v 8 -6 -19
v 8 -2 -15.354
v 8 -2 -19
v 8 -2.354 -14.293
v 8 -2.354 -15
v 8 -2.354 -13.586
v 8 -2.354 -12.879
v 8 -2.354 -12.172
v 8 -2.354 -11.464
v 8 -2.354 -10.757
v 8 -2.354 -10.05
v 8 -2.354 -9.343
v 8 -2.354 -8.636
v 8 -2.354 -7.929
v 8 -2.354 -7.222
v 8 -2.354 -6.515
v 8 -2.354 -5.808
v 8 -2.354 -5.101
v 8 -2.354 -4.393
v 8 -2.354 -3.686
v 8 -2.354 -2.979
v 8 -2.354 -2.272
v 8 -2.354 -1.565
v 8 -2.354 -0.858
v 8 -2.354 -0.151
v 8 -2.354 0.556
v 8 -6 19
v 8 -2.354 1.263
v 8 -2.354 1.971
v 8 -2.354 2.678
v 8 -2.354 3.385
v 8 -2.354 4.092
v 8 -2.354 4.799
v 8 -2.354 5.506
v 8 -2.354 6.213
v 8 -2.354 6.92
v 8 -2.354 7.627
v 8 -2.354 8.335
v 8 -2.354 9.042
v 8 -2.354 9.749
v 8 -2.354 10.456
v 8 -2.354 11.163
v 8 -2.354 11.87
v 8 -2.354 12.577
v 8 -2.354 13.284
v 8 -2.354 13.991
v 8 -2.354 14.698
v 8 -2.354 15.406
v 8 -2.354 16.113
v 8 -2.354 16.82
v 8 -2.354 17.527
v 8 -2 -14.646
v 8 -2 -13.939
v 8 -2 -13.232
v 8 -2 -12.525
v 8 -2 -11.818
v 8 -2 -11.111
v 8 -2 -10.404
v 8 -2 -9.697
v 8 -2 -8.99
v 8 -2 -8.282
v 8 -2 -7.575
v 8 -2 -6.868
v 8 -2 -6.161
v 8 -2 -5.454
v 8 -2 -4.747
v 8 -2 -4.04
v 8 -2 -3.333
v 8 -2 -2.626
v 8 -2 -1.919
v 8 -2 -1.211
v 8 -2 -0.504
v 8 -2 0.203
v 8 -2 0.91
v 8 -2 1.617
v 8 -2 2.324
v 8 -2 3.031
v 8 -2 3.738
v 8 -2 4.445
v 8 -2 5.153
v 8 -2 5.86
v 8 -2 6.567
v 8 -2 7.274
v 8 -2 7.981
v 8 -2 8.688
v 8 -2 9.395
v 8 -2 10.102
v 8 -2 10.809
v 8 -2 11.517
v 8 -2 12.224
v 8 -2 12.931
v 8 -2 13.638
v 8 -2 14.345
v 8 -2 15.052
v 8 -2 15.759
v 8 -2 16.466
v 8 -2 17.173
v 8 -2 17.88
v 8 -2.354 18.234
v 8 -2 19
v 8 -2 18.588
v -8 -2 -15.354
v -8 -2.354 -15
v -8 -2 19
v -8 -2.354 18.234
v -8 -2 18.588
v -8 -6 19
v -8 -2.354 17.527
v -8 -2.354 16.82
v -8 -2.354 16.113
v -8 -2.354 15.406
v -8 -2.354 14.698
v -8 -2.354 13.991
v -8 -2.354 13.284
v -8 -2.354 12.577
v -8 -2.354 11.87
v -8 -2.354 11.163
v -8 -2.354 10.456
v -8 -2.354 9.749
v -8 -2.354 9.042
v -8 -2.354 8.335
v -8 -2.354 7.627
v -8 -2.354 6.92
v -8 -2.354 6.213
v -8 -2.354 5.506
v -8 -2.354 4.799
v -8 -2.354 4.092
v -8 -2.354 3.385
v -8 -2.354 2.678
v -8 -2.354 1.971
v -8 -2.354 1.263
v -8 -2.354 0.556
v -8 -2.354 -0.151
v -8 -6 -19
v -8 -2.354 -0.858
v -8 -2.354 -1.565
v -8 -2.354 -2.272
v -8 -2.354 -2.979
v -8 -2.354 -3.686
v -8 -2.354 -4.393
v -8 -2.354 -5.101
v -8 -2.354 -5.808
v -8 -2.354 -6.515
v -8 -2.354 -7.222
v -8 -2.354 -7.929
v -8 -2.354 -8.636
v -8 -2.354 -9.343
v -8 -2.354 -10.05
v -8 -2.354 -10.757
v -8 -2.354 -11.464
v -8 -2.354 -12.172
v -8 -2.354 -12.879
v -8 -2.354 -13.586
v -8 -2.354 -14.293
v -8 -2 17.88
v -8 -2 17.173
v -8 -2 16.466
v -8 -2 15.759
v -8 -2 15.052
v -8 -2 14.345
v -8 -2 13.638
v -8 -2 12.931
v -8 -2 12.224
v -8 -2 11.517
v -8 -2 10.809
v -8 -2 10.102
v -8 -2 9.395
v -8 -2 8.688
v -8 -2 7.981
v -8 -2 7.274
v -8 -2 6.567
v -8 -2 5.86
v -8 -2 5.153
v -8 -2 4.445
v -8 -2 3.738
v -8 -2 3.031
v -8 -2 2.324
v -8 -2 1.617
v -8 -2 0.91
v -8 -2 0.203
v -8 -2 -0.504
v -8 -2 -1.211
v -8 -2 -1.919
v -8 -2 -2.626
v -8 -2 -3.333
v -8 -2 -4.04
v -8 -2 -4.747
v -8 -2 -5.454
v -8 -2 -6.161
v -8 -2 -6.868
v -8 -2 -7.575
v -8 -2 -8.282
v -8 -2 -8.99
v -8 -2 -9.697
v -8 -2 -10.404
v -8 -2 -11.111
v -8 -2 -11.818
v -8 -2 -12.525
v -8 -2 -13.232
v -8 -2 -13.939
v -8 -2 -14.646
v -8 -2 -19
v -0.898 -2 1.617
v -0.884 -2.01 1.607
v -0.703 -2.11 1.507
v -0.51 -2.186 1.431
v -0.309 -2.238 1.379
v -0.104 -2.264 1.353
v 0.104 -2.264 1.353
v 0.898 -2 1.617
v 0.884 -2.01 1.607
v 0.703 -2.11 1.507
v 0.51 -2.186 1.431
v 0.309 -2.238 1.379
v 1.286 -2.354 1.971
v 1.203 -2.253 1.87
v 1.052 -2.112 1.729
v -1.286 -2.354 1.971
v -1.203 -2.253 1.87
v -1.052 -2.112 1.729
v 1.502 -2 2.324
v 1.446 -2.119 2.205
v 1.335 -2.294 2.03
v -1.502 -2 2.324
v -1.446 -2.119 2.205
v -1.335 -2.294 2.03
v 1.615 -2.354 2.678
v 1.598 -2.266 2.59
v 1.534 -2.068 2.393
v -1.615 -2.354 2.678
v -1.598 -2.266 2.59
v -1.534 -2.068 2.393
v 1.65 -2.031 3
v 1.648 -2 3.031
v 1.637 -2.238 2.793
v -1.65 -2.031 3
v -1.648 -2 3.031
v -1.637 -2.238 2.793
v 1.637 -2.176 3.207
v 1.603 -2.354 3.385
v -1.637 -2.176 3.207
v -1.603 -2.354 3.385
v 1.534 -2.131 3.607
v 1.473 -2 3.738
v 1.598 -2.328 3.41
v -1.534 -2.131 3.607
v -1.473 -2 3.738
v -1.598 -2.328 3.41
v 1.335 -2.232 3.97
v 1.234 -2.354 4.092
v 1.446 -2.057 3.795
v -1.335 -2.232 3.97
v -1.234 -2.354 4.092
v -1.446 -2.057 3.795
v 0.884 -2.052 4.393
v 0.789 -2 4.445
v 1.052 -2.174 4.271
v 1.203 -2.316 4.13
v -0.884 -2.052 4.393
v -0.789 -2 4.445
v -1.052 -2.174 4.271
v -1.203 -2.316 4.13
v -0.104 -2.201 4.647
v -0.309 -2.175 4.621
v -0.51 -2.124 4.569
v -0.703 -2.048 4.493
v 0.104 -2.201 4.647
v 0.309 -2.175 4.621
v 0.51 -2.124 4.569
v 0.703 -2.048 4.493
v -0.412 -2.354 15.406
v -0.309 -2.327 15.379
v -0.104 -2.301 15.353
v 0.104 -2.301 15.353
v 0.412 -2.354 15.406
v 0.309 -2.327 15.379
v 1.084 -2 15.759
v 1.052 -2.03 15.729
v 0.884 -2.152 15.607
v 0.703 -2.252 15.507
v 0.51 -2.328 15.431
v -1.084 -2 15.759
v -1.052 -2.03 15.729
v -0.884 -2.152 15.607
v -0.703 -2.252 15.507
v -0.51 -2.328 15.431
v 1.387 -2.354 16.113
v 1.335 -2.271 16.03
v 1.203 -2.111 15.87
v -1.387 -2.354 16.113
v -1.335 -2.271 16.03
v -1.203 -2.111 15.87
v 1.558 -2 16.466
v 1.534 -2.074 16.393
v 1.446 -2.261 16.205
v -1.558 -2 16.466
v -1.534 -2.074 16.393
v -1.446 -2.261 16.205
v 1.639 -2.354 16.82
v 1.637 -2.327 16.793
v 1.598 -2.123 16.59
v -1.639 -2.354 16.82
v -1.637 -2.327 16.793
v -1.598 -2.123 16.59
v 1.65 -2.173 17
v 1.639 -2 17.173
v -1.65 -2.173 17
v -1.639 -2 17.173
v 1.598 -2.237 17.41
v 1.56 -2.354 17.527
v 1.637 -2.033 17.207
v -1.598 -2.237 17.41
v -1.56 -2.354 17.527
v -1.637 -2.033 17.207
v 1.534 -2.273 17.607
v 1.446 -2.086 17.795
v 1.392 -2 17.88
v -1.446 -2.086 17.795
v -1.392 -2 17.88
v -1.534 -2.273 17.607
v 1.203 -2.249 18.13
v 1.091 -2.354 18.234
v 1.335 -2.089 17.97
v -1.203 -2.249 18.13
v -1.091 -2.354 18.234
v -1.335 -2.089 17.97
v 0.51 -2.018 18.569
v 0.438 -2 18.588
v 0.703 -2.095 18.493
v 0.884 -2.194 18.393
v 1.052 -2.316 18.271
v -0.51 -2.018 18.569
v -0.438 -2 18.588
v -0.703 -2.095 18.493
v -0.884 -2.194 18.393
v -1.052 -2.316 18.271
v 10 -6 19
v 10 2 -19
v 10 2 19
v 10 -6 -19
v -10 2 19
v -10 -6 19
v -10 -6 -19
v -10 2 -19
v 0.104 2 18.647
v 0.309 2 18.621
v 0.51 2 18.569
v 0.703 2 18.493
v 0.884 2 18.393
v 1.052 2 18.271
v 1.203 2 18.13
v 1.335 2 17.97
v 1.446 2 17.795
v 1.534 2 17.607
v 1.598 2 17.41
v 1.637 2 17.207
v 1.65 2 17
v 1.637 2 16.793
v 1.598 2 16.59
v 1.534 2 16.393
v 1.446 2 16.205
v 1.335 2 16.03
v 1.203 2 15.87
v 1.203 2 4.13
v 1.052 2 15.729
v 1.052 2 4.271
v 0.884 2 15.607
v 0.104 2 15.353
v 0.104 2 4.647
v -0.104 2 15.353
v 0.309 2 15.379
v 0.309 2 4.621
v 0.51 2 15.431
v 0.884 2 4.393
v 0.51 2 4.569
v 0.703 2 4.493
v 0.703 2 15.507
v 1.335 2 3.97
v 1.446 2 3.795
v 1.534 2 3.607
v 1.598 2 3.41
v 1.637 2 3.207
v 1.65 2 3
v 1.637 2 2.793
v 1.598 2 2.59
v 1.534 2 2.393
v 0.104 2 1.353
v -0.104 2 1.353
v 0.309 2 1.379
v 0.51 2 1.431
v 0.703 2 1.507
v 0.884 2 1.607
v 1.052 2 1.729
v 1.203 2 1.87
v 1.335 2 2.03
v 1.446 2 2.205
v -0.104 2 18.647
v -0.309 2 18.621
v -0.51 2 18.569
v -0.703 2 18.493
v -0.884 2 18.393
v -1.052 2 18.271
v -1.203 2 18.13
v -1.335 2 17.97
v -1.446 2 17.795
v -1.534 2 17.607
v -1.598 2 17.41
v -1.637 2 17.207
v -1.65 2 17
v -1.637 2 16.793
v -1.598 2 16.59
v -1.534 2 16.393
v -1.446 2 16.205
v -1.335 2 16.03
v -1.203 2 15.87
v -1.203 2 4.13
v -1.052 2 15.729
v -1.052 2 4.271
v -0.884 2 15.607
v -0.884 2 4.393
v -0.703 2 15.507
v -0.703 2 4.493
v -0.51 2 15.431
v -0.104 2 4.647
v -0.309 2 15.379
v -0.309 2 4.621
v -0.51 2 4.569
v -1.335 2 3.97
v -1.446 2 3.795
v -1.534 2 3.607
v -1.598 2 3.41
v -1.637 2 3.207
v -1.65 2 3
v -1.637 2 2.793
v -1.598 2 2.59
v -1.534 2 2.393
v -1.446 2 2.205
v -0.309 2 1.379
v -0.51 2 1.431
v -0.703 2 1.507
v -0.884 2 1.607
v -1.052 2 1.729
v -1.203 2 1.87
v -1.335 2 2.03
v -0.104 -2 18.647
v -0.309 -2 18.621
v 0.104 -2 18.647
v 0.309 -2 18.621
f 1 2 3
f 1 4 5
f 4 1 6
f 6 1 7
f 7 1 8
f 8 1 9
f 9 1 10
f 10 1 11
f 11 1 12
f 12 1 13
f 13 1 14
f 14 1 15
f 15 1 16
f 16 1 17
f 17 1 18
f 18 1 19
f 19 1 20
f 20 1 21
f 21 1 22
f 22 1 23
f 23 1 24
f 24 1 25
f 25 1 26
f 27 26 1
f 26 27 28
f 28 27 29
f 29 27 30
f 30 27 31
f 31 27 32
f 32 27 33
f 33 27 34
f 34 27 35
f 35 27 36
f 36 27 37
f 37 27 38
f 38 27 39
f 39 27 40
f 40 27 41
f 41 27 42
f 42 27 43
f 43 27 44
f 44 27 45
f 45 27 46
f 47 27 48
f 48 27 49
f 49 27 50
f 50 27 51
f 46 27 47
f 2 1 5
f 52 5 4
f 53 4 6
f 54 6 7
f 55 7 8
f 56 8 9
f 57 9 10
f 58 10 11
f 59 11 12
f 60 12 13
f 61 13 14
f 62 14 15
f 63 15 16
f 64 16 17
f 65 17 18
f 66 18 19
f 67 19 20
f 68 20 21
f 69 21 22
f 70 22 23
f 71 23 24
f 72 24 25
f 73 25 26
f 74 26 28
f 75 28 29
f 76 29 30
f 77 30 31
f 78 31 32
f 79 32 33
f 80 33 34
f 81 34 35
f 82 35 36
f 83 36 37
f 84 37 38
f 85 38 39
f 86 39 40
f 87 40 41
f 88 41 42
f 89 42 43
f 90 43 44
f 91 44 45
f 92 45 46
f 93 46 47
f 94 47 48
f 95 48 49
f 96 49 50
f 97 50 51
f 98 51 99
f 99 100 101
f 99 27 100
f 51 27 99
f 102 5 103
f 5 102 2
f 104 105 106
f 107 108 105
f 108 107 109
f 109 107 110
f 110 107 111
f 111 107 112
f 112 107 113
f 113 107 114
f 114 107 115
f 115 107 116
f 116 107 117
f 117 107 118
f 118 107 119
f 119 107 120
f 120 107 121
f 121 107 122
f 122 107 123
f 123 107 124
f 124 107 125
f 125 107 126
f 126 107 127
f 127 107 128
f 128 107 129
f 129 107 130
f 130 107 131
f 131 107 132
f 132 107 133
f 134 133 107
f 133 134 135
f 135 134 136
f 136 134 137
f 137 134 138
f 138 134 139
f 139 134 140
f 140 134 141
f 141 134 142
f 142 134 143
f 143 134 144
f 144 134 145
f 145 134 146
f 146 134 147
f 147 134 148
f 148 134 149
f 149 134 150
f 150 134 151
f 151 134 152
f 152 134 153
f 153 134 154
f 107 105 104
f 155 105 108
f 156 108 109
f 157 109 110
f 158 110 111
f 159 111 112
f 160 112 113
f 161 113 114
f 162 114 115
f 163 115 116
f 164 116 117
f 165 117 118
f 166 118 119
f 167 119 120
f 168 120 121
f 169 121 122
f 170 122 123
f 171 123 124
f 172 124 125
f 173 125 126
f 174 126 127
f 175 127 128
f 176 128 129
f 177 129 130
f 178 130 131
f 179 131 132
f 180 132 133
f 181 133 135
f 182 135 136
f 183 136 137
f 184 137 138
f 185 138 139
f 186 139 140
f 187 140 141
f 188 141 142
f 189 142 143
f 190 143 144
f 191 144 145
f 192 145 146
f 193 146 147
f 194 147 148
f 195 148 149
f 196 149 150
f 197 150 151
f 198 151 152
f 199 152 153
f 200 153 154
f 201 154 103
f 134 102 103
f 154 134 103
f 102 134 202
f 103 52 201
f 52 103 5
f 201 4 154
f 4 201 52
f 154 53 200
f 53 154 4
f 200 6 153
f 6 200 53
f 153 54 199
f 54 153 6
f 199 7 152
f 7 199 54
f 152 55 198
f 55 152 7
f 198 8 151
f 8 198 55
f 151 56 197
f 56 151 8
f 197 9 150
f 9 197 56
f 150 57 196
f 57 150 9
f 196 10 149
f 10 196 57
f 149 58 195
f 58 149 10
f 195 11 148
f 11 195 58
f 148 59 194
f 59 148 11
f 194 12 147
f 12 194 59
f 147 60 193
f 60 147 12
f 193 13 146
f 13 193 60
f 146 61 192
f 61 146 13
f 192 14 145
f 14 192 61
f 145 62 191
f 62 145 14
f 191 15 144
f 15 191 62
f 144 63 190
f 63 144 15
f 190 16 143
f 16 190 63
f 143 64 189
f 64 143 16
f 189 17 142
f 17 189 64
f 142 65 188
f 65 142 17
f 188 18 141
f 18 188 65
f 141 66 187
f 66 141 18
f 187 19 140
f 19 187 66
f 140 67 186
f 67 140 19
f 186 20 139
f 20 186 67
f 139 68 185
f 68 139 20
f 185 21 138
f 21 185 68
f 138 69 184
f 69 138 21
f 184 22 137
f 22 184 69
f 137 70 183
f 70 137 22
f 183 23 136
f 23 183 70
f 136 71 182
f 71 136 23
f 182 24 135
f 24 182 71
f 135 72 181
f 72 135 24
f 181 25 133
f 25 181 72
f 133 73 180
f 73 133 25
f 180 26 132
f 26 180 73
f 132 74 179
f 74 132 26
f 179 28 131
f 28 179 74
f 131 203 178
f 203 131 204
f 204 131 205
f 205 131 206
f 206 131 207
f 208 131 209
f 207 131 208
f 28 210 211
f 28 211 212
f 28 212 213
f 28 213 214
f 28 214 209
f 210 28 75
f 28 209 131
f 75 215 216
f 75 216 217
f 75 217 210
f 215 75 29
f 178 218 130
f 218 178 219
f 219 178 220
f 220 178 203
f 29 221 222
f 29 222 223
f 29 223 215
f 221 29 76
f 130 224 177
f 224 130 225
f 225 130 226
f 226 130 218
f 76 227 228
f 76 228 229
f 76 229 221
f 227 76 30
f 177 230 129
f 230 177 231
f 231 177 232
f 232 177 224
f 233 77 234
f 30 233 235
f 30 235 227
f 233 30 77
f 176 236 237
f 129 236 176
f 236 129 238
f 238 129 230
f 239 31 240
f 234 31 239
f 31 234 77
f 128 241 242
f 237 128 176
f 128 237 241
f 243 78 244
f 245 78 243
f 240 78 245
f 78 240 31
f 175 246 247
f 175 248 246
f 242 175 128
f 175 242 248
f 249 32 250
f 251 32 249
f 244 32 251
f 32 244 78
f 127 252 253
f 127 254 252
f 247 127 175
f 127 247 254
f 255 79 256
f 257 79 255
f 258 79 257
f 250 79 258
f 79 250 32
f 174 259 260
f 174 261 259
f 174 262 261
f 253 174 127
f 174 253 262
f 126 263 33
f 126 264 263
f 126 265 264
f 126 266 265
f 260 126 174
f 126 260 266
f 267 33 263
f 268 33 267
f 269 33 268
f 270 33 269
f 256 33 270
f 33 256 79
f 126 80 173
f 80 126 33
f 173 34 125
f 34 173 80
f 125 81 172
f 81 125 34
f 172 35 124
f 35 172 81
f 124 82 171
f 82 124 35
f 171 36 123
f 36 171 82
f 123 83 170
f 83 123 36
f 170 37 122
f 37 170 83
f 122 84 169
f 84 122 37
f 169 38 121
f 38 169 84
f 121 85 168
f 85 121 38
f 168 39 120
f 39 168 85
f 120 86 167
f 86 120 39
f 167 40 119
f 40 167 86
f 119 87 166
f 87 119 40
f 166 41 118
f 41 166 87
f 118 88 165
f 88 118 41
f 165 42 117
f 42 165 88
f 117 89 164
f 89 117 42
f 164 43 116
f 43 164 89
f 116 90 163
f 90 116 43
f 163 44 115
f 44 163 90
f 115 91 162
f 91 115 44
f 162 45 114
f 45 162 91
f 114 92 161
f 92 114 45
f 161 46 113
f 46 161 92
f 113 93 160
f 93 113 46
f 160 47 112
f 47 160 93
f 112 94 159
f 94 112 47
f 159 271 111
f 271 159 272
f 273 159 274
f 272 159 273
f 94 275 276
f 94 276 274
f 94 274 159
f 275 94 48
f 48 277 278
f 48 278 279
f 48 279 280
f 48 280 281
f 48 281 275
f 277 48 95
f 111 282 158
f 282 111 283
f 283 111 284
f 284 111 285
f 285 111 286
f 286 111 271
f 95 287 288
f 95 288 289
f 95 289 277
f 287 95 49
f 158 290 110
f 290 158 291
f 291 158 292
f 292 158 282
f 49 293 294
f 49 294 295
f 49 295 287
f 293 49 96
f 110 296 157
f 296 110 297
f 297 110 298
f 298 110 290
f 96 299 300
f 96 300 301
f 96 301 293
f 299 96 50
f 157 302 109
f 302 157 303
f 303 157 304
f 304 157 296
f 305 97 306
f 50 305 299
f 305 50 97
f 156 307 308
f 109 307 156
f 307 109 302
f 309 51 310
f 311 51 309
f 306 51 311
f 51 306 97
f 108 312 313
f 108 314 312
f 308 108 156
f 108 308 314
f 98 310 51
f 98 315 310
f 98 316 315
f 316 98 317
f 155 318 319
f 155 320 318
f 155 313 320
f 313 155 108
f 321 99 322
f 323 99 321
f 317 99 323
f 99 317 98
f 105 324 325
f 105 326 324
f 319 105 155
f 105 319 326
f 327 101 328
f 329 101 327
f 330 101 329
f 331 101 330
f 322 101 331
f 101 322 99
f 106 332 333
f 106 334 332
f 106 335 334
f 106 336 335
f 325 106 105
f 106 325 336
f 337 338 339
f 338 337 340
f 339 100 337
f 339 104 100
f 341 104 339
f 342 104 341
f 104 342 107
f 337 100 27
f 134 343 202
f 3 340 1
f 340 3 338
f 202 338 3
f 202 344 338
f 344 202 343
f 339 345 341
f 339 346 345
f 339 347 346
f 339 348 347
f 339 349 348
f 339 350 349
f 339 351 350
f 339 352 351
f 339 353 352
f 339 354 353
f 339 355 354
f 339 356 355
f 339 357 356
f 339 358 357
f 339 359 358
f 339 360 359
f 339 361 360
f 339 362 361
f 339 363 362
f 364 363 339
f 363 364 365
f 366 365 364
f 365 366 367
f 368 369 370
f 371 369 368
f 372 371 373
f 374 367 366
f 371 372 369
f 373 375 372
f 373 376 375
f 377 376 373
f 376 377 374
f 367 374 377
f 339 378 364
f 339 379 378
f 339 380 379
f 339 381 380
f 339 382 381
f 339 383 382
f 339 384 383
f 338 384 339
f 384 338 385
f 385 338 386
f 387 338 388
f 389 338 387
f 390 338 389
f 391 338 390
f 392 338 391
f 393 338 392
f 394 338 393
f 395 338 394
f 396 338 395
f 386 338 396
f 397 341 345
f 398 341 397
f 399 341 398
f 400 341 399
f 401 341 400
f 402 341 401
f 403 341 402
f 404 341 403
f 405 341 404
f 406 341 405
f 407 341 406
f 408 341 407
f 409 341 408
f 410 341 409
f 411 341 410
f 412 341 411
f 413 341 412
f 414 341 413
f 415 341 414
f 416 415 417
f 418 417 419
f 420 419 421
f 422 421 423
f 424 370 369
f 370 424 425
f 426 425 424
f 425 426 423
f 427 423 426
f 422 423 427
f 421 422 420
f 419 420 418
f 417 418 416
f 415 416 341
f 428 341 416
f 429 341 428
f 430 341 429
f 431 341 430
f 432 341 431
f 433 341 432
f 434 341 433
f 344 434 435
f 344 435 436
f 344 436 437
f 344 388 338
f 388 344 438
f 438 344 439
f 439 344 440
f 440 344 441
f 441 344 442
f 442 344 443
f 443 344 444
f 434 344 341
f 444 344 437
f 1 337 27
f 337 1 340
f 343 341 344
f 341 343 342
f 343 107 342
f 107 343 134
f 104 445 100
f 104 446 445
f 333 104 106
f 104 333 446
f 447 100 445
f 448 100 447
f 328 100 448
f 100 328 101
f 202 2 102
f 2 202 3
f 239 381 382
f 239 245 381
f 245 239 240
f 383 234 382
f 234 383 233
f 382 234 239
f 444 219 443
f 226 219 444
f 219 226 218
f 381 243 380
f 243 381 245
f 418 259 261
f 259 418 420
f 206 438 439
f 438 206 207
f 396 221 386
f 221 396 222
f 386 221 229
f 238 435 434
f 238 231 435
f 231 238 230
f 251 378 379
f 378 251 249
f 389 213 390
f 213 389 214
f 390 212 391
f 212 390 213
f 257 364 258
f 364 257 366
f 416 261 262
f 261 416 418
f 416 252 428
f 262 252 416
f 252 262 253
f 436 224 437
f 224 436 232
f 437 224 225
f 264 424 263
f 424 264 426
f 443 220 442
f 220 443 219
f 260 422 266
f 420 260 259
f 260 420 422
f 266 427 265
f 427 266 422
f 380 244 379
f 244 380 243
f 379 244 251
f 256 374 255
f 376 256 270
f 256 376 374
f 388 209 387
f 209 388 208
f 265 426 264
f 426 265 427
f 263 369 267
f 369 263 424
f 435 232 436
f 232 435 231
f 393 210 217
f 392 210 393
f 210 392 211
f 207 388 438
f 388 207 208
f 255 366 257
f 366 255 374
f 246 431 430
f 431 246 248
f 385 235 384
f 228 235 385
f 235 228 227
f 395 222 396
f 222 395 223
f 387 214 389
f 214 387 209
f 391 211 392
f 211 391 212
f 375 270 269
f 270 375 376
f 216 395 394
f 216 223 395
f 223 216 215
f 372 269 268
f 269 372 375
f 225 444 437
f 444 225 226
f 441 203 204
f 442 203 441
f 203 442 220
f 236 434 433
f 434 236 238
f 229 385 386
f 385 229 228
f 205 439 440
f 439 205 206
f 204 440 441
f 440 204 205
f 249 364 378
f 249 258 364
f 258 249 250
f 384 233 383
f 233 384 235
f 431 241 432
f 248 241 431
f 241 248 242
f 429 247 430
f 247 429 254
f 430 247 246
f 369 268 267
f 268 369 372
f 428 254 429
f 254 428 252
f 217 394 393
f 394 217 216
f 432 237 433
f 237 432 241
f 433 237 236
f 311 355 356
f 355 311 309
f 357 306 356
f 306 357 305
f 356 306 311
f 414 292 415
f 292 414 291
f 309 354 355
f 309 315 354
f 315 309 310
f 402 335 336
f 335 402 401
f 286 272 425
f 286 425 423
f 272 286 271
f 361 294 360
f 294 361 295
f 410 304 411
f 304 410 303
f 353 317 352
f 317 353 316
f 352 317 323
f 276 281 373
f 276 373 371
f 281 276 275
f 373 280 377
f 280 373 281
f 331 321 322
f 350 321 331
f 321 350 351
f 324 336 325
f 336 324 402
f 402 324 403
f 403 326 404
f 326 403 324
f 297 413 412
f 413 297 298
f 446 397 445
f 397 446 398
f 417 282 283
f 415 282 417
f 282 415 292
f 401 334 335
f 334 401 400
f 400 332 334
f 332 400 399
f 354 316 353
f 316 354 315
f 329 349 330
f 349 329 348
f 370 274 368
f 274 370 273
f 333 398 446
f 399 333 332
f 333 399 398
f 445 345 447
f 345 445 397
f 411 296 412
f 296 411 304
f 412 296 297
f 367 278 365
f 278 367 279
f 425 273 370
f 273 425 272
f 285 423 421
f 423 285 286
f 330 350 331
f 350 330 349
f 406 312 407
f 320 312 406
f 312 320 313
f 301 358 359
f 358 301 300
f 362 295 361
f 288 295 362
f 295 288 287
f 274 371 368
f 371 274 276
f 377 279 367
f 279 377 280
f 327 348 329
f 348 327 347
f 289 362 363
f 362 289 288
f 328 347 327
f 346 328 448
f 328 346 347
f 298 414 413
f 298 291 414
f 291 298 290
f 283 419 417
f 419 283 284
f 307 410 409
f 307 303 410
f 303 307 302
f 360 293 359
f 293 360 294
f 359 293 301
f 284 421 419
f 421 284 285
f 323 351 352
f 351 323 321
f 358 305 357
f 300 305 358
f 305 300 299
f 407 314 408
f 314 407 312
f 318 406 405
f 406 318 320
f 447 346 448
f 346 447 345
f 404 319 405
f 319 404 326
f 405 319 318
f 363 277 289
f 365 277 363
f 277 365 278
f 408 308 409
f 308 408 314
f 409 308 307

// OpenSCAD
// file: serrated45_plane.scad
// serration using cubes




module serrated45_plane (pitch, length, width) {
    union () {
        for(i = [0:(length - 1)]) {
            translate([i * cos(45), 0, 0])
            rotate([0,0,45])
            cube( [pitch, pitch, width], center = true);
        }
    }
    {
        plane_length = pitch * cos(45) * 2 * length;
        translate([plane_length/2, - pitch/2 * 0.95, 0])
        cube([plane_length, pitch/2, width], center = true);
    }
}


// serrated45_plane (0.5, 80, 18);
// main file
include <serrated45_plane.scad>;

// GPU brace - Female
//           - Bottom half
// printing - solid
// precision - 0.06



base_thickness = 4;

male_x = 16;
male_y = 4;
male_z = 34 + base_thickness;    // add 4mm to go through the base

flange_x = 2;
flange_y = 8;
flange_z = male_z;

// mounting to base
mounting_screw_dia = 2;
mounting_screw_length = 10;
mounting_washer_dia = 5;
mounting_screw_head_dia = 4;

// M4 mounting 
mating_screw_dia = 4;
mating_screw_pilot = 3.3;

mount_1_cl = 18;
mount_2_cl = 32;

$fn = 50;



difference () {
    {
    union () {

        
        // flanges
        translate([male_x/2 + flange_x/2,-(flange_y-male_y)/2,0])
        cube([flange_x,flange_y, flange_z], center = true);
        
        translate([-(male_x/2 + flange_x/2),-(flange_y-male_y)/2,0])
        cube([flange_x,flange_y, flange_z], center = true);
        
        // center

        cube([male_x,male_y, male_z], center = true);        
        
        // serration
        translate([0, -male_y/2, -male_z/2 + base_thickness])
        rotate([180,-90,0])
        serrated45_plane(0.5, 48, male_x);
        }
    }
    {

        

    translate([0, male_y/2 - 3, -male_z/2 + base_thickness + mount_1_cl])
    rotate([90,0,0])
    #cylinder(r = mating_screw_pilot/2, h = 6, center = true);
        
    translate([0, male_y/2 - 3, -male_z/2 + base_thickness + mount_2_cl])
    rotate([90,0,0])
    cylinder(r = mating_screw_pilot/2, h = 6, center = true);
    

    }
}
